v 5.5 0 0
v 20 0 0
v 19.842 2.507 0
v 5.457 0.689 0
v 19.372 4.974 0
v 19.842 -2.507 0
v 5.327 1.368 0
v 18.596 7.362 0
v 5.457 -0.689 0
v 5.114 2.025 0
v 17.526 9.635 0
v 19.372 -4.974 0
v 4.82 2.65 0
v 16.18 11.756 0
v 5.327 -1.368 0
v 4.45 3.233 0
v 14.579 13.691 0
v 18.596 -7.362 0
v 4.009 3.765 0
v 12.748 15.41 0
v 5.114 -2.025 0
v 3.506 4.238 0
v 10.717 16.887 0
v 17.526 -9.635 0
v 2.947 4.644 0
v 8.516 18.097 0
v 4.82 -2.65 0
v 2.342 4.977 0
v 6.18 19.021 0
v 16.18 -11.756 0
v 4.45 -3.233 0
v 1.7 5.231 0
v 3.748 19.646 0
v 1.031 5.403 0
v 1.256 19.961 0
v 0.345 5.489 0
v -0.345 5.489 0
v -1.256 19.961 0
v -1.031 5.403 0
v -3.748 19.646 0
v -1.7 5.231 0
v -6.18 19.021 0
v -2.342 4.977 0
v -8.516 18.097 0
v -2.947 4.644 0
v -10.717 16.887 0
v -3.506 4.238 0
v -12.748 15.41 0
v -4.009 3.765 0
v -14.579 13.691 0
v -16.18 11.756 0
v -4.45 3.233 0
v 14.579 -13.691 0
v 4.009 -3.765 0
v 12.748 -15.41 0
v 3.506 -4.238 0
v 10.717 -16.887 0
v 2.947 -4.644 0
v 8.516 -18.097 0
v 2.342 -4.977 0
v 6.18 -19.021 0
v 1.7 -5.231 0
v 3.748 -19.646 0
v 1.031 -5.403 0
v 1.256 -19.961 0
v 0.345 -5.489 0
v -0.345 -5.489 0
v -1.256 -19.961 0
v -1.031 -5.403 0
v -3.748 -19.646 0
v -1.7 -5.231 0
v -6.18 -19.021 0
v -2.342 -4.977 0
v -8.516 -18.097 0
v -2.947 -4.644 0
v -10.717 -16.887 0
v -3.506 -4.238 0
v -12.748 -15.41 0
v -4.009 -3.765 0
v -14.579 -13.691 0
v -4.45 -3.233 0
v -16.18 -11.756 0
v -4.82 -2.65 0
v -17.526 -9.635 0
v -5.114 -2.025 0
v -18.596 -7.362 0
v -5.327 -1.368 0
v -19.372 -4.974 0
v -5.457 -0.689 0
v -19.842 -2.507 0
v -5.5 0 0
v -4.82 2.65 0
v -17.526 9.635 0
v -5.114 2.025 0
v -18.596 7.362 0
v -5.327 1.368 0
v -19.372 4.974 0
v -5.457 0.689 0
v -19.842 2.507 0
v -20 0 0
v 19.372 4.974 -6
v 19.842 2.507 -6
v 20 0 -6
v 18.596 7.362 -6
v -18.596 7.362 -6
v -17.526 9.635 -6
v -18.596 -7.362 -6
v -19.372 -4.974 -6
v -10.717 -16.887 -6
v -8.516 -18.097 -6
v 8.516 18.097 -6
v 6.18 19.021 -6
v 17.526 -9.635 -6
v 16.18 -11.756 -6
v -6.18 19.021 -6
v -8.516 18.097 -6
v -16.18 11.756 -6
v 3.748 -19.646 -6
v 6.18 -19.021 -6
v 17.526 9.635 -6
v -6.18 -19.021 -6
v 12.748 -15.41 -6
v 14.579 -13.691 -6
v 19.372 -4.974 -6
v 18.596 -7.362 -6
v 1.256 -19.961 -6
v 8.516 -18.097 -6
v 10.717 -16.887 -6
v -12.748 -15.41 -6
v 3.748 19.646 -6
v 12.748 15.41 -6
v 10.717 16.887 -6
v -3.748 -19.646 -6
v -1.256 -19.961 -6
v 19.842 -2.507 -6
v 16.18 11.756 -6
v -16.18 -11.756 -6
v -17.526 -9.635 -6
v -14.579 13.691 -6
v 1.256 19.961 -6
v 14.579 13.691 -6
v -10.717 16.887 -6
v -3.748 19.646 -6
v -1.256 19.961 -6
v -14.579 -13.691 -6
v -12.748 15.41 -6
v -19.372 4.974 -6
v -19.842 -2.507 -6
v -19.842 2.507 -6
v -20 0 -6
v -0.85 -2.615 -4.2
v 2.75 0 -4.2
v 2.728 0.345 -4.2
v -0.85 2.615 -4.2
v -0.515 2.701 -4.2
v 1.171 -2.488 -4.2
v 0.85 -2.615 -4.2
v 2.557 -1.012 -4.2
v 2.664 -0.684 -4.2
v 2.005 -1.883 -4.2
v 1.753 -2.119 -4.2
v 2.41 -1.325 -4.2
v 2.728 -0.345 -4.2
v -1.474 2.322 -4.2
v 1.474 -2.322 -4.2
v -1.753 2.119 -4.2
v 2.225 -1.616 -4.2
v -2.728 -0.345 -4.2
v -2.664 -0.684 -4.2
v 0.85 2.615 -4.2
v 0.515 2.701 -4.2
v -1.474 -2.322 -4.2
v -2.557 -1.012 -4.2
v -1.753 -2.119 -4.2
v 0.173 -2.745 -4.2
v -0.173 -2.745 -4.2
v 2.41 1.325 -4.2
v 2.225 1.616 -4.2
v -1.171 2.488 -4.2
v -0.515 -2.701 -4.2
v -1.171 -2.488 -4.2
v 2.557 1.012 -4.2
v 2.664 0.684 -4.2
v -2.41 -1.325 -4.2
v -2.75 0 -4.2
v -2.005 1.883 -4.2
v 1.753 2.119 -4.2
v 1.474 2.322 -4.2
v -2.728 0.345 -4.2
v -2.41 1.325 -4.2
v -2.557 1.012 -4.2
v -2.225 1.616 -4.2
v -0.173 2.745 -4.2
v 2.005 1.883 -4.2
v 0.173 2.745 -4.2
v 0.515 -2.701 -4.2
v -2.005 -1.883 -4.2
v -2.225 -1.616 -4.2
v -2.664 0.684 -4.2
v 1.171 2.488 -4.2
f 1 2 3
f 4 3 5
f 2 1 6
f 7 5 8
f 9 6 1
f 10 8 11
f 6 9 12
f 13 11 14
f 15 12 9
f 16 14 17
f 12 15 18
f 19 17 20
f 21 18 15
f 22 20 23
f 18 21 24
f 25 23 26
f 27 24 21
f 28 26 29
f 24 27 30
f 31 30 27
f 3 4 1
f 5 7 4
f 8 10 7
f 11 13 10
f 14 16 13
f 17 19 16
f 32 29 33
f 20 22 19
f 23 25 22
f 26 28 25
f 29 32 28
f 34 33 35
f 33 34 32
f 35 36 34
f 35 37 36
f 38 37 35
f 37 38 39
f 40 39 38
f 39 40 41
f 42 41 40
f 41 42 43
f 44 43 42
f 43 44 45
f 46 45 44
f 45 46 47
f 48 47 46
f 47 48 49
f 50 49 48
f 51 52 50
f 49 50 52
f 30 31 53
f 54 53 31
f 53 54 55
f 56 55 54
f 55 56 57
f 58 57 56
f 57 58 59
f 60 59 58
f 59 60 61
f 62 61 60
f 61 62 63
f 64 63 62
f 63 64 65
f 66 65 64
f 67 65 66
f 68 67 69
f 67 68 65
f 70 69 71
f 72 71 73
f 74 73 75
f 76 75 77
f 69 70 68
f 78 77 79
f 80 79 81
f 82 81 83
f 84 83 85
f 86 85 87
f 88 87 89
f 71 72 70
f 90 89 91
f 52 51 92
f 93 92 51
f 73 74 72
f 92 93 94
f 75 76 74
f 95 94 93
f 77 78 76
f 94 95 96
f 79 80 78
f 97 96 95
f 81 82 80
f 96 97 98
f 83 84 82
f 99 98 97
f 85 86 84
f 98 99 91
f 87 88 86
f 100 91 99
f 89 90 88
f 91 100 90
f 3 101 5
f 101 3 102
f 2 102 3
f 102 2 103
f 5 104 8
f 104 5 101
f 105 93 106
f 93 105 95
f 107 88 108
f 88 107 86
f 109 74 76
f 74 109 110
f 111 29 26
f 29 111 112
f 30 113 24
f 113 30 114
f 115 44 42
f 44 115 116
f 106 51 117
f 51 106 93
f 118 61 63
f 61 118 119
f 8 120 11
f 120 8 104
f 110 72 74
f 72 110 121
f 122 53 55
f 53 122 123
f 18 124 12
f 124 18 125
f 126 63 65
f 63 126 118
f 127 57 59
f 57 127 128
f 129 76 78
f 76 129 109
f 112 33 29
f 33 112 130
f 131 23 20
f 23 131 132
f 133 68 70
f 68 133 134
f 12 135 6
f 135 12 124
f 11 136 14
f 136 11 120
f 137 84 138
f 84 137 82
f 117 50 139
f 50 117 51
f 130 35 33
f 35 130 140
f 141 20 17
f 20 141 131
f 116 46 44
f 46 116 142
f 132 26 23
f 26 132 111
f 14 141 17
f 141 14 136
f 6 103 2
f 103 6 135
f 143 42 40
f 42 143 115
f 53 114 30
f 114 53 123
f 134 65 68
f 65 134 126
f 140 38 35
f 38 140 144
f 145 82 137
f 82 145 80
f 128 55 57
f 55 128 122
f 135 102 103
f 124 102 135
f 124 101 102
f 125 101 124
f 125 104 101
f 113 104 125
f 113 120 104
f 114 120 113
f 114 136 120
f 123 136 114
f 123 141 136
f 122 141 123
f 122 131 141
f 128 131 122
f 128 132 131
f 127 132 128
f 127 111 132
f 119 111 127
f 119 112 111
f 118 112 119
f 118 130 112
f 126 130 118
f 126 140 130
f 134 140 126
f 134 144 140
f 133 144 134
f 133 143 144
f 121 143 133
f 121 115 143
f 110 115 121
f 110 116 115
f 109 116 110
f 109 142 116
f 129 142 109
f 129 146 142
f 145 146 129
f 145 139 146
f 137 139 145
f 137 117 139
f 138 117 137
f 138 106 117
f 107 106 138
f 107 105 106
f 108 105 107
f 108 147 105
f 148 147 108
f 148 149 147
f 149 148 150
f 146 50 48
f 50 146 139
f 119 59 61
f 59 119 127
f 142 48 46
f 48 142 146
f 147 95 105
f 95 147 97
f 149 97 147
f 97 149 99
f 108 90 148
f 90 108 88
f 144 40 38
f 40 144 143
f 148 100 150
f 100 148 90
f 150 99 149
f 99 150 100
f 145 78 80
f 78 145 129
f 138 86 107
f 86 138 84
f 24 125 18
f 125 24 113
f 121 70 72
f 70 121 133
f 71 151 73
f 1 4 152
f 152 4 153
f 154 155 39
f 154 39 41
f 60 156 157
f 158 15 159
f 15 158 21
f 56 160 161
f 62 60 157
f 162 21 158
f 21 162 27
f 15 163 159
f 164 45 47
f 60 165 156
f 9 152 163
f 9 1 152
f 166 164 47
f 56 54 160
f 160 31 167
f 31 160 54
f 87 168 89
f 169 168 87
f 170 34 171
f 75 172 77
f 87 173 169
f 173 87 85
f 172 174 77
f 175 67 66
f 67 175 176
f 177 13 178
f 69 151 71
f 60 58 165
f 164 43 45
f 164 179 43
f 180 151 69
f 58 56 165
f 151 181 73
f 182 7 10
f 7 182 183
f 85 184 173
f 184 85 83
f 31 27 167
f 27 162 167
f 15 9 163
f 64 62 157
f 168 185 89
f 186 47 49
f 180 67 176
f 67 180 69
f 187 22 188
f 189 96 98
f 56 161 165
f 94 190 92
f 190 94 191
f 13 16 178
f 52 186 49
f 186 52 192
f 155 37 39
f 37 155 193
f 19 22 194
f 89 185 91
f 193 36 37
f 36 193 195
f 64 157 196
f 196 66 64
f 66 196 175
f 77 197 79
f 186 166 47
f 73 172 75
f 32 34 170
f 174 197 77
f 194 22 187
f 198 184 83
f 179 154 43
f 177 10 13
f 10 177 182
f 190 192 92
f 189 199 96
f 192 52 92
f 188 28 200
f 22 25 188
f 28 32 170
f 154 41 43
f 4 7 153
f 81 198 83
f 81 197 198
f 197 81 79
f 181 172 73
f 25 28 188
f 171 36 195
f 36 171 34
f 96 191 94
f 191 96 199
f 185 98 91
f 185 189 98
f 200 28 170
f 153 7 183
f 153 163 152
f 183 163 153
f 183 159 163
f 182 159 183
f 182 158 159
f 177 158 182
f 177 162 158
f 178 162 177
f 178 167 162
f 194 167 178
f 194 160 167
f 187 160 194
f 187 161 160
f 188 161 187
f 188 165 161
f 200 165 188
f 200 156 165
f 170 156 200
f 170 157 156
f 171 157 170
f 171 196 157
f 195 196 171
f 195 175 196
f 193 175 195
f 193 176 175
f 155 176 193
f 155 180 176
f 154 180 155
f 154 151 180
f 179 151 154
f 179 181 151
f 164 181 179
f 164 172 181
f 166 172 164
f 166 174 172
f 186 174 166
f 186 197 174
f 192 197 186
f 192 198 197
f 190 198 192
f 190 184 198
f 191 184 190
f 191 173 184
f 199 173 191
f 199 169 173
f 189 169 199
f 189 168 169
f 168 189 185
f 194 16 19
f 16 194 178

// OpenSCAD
$fn = 50;


difference() {
	union() {
		translate(v = [0, 0, -3.0000000000]) {
			cylinder(h = 3, r = 10.0000000000);
		}
		translate(v = [0, 0, -6.0000000000]) {
			cylinder(h = 6, r = 20.0000000000);
		}
	}
	union() {
		translate(v = [0, 0, 0]) {
			rotate(a = [0, 0, 0]) {
				difference() {
					union() {
						#translate(v = [0, 0, -3.0000000000]) {
							cylinder(h = 3, r = 2.2500000000);
						}
						#translate(v = [0, 0, -4.2000000000]) {
							cylinder(h = 4.2000000000, r1 = 2.7500000000, r2 = 5.5000000000);
						}
						#translate(v = [0, 0, -3.0000000000]) {
							cylinder(h = 3, r = 2.7500000000);
						}
						#translate(v = [0, 0, -3.0000000000]) {
							cylinder(h = 3, r = 2.2500000000);
						}
					}
					union();
				}
			}
		}
	}
}
